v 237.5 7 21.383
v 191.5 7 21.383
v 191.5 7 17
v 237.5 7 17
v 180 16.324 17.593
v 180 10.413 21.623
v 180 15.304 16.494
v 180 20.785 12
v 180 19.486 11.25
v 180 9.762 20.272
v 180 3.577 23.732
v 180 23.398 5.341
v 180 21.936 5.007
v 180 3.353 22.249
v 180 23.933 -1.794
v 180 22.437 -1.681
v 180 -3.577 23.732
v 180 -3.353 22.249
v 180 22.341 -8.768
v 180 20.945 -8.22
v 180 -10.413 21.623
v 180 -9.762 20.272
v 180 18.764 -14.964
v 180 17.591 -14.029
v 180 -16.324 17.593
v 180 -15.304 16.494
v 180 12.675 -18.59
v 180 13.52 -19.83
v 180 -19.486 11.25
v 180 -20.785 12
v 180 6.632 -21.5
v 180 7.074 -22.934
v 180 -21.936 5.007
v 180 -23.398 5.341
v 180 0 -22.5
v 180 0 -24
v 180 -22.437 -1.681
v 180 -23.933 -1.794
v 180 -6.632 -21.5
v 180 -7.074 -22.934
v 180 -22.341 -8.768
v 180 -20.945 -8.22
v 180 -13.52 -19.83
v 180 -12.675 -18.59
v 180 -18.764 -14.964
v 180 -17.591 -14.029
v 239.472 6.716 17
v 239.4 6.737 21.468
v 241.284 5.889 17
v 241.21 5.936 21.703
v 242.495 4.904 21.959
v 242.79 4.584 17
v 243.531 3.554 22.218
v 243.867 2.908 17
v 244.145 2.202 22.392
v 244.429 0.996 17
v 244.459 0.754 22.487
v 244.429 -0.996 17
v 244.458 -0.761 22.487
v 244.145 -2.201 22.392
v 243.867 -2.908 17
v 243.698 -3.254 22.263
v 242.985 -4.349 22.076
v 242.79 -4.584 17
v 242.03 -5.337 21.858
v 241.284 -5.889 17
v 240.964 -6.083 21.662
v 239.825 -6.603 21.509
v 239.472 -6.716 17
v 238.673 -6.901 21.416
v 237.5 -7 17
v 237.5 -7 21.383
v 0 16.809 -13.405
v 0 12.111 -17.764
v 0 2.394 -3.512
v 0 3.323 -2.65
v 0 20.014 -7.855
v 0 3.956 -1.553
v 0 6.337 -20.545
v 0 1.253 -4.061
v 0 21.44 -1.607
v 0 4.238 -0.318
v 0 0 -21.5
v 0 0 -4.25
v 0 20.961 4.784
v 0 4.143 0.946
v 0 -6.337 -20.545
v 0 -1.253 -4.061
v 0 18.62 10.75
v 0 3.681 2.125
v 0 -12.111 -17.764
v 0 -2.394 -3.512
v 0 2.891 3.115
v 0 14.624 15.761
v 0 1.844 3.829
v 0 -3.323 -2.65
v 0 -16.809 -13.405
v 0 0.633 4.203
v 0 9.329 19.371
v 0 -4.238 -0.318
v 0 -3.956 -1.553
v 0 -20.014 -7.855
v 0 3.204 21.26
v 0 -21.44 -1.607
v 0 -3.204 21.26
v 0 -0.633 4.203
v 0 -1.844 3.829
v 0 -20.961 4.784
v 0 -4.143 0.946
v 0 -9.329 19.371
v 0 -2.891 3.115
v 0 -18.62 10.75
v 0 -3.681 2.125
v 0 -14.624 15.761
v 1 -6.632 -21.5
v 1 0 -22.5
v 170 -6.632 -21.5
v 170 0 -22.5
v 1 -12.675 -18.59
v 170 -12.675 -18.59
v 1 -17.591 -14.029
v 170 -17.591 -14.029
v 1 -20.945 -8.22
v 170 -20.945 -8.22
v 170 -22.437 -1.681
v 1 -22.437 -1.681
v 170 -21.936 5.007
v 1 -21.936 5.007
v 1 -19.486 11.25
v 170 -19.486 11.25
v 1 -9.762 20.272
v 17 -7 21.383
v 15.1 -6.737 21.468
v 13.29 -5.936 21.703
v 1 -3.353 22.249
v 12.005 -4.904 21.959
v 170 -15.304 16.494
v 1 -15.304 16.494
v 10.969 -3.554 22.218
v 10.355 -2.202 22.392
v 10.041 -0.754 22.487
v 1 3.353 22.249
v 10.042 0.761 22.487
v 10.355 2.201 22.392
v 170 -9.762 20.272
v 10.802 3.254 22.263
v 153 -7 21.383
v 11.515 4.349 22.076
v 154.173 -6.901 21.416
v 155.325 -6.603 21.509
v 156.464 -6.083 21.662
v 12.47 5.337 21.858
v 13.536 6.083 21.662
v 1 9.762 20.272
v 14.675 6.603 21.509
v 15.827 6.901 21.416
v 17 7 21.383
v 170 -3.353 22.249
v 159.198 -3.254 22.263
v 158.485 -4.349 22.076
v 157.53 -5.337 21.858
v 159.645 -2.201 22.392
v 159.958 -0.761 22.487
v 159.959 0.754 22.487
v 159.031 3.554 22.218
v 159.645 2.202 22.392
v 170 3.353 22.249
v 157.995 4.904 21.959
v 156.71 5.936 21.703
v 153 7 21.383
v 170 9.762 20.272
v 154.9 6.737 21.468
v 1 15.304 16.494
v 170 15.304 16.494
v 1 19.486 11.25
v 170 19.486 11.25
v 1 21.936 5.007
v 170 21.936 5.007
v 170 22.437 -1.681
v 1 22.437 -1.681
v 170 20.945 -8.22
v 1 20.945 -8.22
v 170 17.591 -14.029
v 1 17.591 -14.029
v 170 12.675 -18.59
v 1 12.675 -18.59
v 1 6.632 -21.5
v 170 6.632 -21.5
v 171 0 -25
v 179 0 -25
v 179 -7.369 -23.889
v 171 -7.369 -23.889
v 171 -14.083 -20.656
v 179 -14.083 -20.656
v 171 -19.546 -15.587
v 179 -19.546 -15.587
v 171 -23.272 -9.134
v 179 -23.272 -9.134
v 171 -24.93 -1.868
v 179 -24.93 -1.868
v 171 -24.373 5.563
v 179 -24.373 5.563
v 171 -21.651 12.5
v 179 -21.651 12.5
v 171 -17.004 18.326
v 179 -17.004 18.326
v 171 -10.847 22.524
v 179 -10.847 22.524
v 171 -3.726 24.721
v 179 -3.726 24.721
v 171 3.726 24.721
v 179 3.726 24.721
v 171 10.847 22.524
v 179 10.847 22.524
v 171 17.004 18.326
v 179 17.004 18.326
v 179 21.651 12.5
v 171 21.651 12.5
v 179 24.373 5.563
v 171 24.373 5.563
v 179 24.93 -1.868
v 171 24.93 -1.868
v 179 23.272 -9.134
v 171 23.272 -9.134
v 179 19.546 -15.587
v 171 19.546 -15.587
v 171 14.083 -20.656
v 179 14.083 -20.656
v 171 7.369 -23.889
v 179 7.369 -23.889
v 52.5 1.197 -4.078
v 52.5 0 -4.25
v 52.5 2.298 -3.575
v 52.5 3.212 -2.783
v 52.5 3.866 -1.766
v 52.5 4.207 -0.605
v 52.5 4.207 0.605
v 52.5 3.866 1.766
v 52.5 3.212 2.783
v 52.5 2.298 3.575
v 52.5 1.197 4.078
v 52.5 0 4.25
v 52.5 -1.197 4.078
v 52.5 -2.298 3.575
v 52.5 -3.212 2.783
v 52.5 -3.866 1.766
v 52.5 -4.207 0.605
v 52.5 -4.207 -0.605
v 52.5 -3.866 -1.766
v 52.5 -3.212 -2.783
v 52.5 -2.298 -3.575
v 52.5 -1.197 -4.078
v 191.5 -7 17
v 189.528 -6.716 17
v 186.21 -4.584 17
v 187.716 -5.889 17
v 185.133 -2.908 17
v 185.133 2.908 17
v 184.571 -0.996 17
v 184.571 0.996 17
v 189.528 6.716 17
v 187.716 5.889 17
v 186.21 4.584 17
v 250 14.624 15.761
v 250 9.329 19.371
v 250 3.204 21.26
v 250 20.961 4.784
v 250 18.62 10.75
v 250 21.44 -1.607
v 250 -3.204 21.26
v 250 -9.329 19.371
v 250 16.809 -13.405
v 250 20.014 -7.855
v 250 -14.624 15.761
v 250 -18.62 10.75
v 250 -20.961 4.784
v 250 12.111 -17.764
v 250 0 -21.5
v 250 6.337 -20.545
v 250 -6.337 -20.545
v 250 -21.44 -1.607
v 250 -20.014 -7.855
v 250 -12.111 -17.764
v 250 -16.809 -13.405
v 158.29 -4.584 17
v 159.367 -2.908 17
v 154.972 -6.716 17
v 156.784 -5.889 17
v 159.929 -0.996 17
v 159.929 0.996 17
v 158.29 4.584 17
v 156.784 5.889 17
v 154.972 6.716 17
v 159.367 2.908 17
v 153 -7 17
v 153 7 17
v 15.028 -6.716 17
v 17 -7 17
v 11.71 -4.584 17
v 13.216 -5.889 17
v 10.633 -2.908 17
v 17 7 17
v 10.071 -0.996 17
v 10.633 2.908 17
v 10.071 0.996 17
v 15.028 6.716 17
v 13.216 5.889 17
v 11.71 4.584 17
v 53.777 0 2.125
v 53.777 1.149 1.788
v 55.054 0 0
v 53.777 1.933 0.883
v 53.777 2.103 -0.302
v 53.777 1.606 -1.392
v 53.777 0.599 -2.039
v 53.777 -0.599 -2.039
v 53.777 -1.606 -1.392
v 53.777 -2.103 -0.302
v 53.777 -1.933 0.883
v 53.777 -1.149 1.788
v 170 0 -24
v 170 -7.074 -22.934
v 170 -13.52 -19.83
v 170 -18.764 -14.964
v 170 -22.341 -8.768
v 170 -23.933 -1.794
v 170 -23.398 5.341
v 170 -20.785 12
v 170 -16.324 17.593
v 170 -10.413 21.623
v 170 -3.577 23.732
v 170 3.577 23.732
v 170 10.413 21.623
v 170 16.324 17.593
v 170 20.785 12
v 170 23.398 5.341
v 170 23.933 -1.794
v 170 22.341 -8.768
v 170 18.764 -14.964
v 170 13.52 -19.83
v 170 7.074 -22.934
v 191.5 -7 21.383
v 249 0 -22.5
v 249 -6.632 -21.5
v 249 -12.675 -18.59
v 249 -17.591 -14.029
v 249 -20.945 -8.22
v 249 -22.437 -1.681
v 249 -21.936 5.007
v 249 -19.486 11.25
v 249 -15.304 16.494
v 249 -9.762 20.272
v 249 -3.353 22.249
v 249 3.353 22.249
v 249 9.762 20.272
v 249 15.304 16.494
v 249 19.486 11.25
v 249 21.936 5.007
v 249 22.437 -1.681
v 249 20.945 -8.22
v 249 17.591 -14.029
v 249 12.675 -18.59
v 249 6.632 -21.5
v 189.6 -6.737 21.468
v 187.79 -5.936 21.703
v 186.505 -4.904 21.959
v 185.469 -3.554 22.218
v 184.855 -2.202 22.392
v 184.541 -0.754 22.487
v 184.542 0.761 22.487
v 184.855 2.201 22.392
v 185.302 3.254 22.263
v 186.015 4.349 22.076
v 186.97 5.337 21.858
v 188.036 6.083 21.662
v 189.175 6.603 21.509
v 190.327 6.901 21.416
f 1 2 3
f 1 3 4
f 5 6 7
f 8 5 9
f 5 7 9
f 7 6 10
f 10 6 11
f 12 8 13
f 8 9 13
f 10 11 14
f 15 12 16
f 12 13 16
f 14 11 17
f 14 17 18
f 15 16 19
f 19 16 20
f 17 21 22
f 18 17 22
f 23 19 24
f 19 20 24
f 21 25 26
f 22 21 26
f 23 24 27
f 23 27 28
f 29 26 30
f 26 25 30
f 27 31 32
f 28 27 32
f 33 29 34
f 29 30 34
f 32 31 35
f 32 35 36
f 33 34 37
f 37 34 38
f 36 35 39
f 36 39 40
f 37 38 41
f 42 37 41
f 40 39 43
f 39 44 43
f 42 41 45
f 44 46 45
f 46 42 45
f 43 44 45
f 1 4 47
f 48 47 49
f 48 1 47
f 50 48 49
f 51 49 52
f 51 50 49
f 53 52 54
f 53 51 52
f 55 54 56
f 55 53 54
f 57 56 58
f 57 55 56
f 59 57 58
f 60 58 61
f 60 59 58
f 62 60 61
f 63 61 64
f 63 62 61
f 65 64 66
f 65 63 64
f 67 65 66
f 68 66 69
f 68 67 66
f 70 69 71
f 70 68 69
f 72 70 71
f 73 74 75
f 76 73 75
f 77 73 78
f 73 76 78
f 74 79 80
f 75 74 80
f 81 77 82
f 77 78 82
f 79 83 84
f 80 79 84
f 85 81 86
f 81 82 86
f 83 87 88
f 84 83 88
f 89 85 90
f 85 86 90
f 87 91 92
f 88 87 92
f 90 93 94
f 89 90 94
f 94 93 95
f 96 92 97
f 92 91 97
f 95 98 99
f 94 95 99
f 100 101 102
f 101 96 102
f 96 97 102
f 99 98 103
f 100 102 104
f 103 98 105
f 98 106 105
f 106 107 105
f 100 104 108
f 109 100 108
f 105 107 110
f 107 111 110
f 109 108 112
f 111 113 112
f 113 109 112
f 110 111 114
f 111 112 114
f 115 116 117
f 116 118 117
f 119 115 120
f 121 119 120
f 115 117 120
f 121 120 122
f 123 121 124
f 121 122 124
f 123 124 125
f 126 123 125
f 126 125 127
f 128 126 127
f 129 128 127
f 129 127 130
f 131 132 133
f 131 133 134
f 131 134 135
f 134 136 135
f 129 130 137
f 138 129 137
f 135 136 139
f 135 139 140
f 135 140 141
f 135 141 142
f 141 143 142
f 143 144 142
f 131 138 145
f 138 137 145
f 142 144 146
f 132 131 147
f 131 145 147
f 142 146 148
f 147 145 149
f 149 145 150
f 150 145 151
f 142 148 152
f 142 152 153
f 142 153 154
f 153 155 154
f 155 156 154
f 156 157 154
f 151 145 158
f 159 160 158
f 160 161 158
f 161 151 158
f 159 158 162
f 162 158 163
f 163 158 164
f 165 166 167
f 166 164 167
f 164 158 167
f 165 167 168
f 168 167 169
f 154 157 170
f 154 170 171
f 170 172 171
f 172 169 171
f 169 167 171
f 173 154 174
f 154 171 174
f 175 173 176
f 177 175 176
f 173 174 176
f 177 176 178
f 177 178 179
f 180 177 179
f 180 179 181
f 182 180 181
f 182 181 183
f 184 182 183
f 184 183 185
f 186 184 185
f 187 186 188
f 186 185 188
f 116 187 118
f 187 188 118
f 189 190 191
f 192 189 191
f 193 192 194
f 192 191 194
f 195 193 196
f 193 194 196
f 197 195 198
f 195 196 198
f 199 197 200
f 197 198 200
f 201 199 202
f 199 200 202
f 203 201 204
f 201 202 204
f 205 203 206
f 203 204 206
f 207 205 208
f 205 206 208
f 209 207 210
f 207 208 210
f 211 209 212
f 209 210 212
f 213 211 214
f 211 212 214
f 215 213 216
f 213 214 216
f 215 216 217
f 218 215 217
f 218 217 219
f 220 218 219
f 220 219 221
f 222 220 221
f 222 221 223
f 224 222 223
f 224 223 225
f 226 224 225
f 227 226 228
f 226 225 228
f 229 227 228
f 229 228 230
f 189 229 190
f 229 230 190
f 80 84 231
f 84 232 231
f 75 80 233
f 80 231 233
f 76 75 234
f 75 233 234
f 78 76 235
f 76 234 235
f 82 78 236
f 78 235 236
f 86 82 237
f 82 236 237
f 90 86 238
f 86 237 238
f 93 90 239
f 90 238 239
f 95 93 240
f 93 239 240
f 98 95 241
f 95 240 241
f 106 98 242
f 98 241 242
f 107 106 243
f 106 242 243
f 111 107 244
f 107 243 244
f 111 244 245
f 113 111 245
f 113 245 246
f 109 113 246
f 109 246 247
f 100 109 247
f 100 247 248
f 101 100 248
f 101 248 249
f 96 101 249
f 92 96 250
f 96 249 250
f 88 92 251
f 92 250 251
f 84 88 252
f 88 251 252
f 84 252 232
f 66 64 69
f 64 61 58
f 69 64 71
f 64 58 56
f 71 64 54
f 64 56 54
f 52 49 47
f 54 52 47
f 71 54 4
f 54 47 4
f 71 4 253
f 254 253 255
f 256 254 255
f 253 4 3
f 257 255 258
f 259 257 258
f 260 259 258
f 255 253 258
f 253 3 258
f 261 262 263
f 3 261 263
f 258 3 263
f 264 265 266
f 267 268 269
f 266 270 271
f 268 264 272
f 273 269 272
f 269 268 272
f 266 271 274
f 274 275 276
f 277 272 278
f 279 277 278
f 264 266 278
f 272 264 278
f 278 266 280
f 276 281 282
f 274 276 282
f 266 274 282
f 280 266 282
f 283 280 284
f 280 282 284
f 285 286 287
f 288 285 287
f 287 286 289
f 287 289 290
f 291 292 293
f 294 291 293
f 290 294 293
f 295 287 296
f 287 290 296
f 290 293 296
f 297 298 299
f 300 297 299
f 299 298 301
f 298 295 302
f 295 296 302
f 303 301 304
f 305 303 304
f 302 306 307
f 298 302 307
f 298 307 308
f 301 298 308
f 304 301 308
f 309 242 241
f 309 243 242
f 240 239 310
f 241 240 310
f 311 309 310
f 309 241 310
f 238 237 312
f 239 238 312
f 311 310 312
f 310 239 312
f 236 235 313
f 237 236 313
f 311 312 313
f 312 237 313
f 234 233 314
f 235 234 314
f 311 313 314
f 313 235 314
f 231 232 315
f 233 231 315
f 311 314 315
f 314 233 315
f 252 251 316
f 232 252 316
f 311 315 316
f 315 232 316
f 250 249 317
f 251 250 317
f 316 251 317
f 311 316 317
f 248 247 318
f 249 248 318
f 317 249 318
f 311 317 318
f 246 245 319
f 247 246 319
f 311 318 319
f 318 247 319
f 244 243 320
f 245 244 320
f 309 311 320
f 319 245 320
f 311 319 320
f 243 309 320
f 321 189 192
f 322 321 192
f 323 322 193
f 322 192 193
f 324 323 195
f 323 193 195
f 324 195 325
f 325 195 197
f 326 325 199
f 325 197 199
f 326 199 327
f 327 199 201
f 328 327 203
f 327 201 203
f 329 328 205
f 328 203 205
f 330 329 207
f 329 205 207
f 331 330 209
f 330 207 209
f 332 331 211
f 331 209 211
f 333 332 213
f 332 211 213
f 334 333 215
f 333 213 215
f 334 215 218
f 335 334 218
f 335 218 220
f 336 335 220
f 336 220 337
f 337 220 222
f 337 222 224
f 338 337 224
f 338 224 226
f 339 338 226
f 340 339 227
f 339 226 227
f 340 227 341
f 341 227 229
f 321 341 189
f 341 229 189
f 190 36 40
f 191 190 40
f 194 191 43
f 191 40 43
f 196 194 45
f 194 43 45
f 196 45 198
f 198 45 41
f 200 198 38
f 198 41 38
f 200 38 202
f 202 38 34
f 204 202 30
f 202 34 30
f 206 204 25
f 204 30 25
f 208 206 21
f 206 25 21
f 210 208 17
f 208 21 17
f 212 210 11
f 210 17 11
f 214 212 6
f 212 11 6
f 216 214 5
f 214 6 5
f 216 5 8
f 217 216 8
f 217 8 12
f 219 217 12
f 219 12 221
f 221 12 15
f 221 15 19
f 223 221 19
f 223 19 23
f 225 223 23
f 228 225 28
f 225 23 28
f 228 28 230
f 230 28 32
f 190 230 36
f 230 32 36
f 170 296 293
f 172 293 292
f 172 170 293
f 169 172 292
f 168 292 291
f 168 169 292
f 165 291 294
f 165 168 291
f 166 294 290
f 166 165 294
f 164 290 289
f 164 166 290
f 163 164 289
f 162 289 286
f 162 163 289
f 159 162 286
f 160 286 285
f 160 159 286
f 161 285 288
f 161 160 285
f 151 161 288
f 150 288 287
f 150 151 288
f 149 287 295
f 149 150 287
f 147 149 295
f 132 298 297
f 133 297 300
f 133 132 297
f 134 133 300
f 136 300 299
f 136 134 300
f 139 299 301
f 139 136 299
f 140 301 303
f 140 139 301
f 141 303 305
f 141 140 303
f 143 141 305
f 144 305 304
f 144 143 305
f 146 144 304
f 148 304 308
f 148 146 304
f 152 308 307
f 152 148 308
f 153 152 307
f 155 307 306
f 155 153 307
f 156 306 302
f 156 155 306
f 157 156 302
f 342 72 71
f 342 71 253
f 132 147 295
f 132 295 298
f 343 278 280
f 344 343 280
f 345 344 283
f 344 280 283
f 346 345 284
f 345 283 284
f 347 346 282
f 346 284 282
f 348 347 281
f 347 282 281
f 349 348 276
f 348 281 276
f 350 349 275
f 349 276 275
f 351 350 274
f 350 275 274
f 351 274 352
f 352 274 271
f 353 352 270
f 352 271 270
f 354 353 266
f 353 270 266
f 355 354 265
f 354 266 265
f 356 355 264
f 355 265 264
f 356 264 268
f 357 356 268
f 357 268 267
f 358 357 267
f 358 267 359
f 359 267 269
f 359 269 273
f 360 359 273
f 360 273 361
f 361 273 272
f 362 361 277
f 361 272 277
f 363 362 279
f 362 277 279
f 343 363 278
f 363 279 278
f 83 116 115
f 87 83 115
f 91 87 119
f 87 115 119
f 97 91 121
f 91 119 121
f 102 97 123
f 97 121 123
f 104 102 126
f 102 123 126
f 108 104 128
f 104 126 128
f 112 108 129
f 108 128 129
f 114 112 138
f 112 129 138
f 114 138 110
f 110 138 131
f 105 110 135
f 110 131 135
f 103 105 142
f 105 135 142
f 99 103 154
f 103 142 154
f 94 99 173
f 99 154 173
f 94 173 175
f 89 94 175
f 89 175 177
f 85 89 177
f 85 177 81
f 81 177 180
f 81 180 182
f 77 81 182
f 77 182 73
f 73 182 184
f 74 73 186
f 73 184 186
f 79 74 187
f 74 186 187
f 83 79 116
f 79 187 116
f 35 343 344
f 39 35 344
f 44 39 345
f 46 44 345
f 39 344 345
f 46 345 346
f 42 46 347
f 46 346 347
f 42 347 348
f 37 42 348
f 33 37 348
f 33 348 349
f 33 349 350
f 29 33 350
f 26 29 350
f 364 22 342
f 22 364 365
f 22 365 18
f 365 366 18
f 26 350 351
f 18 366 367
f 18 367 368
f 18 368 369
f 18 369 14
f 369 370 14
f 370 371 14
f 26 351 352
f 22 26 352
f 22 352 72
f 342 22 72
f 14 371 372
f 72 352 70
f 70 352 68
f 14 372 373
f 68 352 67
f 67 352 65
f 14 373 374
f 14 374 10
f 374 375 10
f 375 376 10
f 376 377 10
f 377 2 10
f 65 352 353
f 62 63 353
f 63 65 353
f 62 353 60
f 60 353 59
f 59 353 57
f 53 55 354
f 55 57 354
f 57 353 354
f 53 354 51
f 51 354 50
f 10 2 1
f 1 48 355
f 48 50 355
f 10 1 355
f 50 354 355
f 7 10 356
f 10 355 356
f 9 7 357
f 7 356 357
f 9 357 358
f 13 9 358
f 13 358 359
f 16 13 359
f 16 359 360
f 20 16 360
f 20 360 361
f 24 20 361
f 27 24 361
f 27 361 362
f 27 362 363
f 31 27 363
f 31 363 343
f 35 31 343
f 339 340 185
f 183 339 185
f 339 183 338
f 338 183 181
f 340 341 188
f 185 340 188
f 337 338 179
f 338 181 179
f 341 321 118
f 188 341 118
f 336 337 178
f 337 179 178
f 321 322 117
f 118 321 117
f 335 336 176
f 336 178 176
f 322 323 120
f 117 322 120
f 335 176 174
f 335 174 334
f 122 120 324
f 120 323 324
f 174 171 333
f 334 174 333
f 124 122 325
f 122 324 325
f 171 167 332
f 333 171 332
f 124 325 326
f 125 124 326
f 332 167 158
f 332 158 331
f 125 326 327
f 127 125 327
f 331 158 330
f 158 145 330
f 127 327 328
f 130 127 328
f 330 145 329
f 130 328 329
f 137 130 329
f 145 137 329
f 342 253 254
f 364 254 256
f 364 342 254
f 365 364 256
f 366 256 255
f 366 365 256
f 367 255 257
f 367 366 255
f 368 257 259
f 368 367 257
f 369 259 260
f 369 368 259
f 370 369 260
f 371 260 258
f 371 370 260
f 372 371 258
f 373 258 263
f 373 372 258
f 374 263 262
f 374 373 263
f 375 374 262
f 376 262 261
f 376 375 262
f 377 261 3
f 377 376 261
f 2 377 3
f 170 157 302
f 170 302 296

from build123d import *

# Parameters (mm, degrees)
HOLE_WIZARD_M101_D     = 8.5
HOLE_WIZARD_M101_DEPTH = 52.5
HOLE_WIZARD_M101_TIP   = 2.553657631
CHAMFER_1_SIZE         = 1
CUT_EXTRUDE_START      = 22.5
CUT_EXTRUDE_1_DEPTH    = 5.5
CUT_EXTRUDE_2_DEPTH    = 5.5


with BuildPart() as part:
    # Эскиз1 → Повернуть1 (revolve)
    with BuildSketch(Plane.XY, mode=Mode.PRIVATE) as revolve_1_sk:
        Polygon((0, 0), (0, 22.5), (170, 22.5), (170, 25), (180, 25), (180, 22.5), (250, 22.5), (250, 0), align=None)
    revolve(revolve_1_sk.sketch.rotate(Axis((0, 0, 0), (-1, 0, 0)), 90), axis=Axis((0, 0, 0), (-1, 0, 0)))

    # Отверстие обработанное метчиком M101
    with Locations(Plane.ZY):
        with Locations((0, 0)):
            Hole(HOLE_WIZARD_M101_D / 2, depth=HOLE_WIZARD_M101_DEPTH)
            with Locations((0, 0, -(HOLE_WIZARD_M101_DEPTH + HOLE_WIZARD_M101_TIP / 2))):  # 118° drill point
                Cone(0, HOLE_WIZARD_M101_D / 2, HOLE_WIZARD_M101_TIP, mode=Mode.SUBTRACT)

    # Фаска1
    chamfer_1_edges = [part.edges().sort_by_distance(p)[0] for p in [
        (250, 0, 22.5),
        (180, 0, 25),
        (170, 0, 25),
        (0, 0, 22.5),
    ]]
    chamfer(chamfer_1_edges, length=CHAMFER_1_SIZE)

    # Эскиз4 → Вырез-Вытянуть1 (cut)
    with BuildSketch(Plane.XY.offset(CUT_EXTRUDE_START)):
        with BuildLine():
            Line((237.5, -7), (191.5, -7))
            ThreePointArc((191.5, -7), (184.5, 0), (191.5, 7))
            Line((191.5, 7), (237.5, 7))
            ThreePointArc((237.5, 7), (244.5, 0), (237.5, -7))
        make_face()
    extrude(amount=-CUT_EXTRUDE_1_DEPTH, mode=Mode.SUBTRACT)

    # Эскиз5 → Вырез-Вытянуть2 (cut)
    with BuildSketch(Plane.XY.offset(CUT_EXTRUDE_START)):
        with BuildLine():
            Line((17, 7), (153, 7))
            ThreePointArc((153, 7), (160, 0), (153, -7))
            Line((153, -7), (17, -7))
            ThreePointArc((17, -7), (10, 0), (17, 7))
        make_face()
    extrude(amount=-CUT_EXTRUDE_2_DEPTH, mode=Mode.SUBTRACT)


solid = part.part
